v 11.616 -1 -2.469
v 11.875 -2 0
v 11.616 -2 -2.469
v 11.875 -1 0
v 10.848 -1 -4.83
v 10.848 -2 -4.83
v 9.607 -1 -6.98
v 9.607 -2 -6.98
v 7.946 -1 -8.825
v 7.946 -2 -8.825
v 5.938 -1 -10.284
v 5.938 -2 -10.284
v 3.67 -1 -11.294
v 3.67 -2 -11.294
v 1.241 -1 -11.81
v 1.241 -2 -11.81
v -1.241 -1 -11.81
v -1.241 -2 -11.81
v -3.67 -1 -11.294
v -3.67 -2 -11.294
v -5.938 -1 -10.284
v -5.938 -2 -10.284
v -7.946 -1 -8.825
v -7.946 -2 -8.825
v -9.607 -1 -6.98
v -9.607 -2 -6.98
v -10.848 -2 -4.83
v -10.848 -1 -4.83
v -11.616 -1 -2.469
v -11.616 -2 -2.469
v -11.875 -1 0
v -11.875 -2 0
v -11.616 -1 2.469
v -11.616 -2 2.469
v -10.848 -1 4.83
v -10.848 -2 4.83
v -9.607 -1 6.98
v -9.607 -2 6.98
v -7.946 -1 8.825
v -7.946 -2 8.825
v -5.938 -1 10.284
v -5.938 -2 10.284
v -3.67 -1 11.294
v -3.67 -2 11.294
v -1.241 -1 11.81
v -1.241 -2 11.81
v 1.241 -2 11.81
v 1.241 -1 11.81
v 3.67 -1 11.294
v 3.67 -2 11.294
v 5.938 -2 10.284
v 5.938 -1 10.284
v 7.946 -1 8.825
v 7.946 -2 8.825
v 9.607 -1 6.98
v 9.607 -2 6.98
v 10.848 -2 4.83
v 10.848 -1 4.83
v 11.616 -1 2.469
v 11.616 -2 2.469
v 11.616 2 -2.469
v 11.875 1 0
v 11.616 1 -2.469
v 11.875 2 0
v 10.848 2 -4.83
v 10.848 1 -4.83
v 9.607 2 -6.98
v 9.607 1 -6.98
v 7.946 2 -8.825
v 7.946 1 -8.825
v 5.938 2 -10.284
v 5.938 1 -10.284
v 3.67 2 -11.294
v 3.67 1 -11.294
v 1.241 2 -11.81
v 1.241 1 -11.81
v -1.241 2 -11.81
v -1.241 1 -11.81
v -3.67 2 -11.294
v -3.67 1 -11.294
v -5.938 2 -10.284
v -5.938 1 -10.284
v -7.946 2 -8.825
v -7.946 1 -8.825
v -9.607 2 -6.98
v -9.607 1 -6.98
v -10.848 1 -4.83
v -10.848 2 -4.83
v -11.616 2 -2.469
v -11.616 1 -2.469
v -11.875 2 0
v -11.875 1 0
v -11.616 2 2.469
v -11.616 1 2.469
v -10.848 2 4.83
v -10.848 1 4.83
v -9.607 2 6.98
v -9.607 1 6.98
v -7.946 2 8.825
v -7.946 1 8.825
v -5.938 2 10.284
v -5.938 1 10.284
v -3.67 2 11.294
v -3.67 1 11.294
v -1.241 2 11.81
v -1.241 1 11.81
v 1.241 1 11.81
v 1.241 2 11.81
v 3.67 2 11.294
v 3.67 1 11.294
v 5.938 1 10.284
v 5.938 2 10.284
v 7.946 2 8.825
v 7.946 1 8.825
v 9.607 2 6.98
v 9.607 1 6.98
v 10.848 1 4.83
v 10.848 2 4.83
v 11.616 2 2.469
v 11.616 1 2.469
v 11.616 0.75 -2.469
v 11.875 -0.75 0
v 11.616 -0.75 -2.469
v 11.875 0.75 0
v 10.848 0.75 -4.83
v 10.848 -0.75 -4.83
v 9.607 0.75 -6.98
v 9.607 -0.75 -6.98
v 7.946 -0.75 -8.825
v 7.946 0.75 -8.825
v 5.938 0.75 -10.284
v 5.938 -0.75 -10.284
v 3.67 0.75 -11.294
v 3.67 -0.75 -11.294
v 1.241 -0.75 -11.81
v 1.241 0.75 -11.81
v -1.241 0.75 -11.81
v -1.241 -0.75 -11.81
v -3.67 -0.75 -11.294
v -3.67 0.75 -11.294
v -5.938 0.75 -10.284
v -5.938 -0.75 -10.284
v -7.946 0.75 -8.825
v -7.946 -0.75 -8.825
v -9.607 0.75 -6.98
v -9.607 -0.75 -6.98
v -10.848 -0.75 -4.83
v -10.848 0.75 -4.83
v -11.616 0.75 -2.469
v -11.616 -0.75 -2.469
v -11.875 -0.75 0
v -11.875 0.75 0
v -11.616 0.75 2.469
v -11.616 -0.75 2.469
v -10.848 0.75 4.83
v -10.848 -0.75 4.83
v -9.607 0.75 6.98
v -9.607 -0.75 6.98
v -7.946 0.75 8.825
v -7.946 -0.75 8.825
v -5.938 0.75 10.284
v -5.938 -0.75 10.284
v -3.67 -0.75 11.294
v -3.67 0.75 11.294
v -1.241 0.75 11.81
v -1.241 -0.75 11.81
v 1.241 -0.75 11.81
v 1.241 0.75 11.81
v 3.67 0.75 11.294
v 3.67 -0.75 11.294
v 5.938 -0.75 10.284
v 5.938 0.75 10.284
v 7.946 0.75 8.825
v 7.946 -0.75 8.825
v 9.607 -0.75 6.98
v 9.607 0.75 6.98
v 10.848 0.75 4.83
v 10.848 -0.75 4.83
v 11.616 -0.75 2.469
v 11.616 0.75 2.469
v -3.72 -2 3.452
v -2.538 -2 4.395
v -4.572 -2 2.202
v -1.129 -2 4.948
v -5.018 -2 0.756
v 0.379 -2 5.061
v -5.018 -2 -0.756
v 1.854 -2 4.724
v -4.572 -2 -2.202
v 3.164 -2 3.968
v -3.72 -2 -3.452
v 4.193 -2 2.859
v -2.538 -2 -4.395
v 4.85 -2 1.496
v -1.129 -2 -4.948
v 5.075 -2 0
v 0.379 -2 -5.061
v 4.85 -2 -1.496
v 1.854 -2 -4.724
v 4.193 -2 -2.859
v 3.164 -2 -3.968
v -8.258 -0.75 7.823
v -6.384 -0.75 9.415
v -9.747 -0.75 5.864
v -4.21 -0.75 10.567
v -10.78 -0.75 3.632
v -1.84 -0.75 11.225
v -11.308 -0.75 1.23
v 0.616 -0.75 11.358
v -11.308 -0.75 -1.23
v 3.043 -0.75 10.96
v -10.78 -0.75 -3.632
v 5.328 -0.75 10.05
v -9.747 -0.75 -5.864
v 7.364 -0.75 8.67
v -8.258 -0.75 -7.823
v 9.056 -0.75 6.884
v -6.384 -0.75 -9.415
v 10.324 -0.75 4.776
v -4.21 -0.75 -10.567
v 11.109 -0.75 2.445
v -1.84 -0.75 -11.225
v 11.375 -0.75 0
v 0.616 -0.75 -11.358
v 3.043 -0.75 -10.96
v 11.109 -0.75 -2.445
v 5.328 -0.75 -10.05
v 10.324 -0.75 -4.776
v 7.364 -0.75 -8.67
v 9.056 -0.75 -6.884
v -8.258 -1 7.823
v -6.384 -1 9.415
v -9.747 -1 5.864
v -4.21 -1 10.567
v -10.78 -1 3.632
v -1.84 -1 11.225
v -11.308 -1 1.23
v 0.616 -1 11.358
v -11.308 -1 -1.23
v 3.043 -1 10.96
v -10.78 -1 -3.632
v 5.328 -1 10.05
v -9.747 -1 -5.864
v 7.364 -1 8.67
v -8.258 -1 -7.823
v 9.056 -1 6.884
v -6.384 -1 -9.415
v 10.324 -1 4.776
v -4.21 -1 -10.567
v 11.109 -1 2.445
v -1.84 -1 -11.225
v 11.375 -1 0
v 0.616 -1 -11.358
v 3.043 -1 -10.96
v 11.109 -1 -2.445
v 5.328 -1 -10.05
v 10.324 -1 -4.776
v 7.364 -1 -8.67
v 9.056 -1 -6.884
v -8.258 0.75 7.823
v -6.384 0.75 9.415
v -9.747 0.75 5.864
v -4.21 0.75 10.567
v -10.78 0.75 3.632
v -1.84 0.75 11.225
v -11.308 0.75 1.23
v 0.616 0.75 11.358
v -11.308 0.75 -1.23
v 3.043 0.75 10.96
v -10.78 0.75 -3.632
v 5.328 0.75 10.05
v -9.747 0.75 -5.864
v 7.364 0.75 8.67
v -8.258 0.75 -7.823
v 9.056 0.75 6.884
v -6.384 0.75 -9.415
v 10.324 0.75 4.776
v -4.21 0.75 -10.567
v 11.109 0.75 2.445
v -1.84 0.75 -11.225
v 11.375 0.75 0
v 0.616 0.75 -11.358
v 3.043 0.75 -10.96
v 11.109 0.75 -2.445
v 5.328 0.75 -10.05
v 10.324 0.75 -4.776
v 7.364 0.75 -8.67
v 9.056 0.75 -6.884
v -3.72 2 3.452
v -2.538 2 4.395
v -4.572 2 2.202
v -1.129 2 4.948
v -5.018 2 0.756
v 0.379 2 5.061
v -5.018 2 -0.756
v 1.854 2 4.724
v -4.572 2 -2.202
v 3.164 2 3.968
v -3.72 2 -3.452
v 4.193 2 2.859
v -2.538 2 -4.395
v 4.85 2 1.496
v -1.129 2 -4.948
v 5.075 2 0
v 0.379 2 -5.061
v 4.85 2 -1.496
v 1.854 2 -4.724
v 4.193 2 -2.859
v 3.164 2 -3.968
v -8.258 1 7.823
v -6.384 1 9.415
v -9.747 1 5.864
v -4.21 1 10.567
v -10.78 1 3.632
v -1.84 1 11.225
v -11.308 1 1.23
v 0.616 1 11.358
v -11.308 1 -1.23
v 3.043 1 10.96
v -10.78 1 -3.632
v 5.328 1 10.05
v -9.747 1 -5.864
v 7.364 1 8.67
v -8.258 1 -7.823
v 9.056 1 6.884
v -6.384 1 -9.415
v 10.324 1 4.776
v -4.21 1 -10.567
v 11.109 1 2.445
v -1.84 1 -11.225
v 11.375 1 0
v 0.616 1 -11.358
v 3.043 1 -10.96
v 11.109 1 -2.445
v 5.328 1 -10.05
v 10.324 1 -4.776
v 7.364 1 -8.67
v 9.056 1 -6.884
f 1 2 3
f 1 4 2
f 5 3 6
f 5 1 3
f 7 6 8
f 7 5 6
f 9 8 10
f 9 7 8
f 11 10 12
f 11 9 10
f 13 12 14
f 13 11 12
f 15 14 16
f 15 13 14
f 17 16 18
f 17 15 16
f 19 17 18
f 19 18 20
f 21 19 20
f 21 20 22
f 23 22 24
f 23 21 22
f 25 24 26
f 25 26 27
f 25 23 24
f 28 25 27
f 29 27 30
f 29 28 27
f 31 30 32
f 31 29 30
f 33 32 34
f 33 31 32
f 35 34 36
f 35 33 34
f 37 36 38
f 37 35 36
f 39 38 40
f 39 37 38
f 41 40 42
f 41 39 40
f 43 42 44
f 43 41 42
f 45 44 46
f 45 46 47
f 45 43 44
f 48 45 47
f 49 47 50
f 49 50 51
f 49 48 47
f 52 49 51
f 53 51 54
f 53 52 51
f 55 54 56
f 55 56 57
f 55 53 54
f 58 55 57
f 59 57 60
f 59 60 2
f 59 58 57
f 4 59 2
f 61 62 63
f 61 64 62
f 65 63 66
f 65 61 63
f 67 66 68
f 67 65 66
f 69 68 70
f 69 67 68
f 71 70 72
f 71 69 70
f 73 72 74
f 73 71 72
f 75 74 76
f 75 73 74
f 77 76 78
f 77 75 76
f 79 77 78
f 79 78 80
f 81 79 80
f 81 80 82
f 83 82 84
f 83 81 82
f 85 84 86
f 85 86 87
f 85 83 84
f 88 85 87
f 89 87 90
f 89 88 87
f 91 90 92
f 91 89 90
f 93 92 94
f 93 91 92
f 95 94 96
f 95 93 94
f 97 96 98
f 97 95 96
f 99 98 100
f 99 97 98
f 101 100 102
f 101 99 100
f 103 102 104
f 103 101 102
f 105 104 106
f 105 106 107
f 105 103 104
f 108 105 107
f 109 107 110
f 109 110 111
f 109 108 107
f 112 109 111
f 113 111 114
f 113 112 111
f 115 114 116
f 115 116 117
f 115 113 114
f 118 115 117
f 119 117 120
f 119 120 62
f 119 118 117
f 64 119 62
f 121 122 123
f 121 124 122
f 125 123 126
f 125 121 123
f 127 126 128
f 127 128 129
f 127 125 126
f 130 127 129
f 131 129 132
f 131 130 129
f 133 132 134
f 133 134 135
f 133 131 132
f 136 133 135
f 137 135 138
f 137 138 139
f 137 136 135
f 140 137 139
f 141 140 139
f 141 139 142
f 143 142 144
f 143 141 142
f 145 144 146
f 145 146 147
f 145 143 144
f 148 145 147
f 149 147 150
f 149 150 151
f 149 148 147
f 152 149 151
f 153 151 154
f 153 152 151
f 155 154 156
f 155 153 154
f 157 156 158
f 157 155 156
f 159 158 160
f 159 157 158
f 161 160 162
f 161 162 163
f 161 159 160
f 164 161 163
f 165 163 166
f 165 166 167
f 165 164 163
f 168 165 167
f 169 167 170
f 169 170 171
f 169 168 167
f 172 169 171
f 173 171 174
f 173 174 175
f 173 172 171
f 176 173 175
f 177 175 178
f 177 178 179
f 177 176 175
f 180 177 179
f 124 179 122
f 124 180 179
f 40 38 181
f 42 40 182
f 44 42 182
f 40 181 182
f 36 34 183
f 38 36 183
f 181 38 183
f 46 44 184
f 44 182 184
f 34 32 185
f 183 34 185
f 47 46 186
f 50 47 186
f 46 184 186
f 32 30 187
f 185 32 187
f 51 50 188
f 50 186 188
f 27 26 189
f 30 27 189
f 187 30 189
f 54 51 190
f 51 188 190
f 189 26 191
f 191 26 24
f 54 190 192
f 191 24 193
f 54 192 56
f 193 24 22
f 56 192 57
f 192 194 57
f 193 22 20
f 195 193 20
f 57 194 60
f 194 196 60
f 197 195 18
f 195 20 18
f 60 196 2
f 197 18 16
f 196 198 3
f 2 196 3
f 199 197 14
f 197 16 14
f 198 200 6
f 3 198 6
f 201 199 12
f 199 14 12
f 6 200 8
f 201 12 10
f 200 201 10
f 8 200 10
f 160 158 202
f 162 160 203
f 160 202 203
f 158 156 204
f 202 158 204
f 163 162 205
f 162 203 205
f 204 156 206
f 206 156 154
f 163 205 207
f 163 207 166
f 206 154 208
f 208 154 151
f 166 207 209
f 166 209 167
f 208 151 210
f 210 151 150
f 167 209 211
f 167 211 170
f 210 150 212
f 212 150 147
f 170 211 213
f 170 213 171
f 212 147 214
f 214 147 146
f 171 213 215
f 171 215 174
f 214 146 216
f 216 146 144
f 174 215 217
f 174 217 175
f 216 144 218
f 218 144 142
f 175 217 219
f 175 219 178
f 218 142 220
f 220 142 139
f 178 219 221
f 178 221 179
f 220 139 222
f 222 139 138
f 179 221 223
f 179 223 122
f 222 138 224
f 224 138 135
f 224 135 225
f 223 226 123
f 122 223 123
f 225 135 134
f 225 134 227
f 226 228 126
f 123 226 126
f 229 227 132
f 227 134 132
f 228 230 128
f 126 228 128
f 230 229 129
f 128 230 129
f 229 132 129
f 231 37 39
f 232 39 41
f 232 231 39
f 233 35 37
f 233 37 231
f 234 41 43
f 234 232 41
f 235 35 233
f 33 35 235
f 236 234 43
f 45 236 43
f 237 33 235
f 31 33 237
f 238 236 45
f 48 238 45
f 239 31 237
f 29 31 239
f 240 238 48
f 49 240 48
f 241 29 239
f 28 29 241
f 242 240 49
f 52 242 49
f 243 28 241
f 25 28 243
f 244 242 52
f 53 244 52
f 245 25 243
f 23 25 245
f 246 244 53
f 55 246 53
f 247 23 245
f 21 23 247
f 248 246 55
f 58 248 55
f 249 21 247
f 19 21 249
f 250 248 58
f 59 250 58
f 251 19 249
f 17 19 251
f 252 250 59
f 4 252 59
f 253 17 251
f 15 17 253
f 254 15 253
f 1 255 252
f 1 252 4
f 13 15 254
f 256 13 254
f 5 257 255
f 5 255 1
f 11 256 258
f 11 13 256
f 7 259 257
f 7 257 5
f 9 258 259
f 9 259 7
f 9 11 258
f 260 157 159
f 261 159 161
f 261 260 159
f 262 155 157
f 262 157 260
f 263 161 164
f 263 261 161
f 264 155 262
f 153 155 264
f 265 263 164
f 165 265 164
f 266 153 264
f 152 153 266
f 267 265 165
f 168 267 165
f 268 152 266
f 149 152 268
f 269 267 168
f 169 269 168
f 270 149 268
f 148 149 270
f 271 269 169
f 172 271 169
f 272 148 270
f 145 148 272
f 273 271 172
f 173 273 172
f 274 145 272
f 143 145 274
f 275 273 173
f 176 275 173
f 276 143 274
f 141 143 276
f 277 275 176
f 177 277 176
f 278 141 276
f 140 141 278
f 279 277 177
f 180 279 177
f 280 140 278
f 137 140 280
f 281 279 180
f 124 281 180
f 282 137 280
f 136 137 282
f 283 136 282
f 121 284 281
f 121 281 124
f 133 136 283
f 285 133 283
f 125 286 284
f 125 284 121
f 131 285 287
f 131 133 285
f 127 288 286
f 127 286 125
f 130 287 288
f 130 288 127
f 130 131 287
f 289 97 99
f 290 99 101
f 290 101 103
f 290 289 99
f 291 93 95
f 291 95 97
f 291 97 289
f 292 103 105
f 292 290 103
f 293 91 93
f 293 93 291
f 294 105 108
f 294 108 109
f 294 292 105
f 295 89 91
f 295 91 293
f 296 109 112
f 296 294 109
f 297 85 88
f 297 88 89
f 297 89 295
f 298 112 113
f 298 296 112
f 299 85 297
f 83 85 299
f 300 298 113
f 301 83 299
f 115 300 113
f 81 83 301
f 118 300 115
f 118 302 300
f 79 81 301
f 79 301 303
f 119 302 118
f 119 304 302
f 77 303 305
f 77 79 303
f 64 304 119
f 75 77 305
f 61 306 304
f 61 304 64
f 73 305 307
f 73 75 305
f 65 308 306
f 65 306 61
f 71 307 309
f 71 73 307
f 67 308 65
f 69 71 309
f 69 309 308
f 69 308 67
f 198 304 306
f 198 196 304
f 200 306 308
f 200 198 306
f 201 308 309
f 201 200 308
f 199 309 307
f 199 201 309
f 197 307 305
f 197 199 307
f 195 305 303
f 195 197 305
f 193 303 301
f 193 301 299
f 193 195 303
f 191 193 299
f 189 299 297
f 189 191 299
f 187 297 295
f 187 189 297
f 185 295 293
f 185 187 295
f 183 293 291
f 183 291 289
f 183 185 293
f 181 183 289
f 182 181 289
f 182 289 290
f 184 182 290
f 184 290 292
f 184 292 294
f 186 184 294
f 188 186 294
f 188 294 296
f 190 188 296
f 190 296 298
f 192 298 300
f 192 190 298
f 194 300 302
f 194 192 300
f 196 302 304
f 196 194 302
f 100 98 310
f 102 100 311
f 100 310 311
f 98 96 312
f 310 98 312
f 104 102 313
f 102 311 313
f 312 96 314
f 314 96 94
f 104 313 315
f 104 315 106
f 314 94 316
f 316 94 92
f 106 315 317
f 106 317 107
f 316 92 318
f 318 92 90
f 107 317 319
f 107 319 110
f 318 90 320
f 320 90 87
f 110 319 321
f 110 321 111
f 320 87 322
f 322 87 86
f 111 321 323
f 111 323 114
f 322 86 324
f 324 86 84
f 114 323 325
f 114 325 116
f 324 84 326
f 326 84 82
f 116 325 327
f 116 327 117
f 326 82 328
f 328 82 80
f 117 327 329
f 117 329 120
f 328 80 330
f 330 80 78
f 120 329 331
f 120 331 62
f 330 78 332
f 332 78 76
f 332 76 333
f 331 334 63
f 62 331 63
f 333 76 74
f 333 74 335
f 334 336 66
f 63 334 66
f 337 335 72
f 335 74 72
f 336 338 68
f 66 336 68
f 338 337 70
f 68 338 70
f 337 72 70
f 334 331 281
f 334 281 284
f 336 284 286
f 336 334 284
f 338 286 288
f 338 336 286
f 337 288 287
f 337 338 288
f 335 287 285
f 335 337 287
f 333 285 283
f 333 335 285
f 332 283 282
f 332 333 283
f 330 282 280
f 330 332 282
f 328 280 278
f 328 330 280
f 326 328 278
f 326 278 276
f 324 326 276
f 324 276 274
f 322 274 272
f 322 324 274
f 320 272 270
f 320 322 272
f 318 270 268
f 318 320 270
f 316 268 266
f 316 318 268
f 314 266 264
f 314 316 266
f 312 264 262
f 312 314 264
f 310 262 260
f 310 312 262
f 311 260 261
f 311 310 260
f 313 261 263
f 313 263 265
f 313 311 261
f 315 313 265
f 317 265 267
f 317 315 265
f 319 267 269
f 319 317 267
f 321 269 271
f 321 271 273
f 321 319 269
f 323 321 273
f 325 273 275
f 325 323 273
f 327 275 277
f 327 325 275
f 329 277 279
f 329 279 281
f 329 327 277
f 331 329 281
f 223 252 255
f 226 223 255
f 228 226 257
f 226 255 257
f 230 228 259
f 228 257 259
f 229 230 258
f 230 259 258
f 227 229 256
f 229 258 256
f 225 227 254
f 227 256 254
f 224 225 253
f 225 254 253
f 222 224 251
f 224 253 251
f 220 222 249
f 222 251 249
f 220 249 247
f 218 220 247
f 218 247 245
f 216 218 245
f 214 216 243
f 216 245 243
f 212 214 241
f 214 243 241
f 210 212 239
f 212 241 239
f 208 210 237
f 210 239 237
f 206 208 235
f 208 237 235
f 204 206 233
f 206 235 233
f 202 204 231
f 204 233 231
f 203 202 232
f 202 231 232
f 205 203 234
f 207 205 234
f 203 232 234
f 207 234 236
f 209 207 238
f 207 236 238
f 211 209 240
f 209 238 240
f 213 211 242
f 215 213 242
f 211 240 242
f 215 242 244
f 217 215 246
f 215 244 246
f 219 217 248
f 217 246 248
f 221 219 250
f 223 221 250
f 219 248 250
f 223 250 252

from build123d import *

# Parameters (mm, degrees)
SKETCH1_R           = 11.875
SKETCH1_R_2         = 5.075
BOSS_EXTRUDE1_DEPTH = 2
SKETCH2_R           = 11.875
SKETCH2_R_2         = 11.375
CUT_EXTRUDE1_DEPTH  = 0.25


with BuildPart() as part:
    # Sketch1 → Boss-Extrude1 (new body, symmetric)
    with BuildSketch(Plane(origin=(0, 0, 0), x_dir=(1, 0, 0), z_dir=(0, 1, 0))):
        Circle(SKETCH1_R)
        Circle(SKETCH1_R_2, mode=Mode.SUBTRACT)
    extrude(amount=BOSS_EXTRUDE1_DEPTH, both=True)

    # Sketch2 → Cut-Extrude1 (cut)
    with BuildSketch(Plane(origin=(0, 1, 0), x_dir=(1, 0, 0), z_dir=(0, 1, 0))):
        Circle(SKETCH2_R)
        Circle(SKETCH2_R_2, mode=Mode.SUBTRACT)
    cut_extrude1 = extrude(amount=-CUT_EXTRUDE1_DEPTH, mode=Mode.SUBTRACT)

    # Mirror1: Cut-Extrude1 across plane
    add(cut_extrude1.mirror(Plane.ZX), mode=Mode.SUBTRACT)


solid = part.part
